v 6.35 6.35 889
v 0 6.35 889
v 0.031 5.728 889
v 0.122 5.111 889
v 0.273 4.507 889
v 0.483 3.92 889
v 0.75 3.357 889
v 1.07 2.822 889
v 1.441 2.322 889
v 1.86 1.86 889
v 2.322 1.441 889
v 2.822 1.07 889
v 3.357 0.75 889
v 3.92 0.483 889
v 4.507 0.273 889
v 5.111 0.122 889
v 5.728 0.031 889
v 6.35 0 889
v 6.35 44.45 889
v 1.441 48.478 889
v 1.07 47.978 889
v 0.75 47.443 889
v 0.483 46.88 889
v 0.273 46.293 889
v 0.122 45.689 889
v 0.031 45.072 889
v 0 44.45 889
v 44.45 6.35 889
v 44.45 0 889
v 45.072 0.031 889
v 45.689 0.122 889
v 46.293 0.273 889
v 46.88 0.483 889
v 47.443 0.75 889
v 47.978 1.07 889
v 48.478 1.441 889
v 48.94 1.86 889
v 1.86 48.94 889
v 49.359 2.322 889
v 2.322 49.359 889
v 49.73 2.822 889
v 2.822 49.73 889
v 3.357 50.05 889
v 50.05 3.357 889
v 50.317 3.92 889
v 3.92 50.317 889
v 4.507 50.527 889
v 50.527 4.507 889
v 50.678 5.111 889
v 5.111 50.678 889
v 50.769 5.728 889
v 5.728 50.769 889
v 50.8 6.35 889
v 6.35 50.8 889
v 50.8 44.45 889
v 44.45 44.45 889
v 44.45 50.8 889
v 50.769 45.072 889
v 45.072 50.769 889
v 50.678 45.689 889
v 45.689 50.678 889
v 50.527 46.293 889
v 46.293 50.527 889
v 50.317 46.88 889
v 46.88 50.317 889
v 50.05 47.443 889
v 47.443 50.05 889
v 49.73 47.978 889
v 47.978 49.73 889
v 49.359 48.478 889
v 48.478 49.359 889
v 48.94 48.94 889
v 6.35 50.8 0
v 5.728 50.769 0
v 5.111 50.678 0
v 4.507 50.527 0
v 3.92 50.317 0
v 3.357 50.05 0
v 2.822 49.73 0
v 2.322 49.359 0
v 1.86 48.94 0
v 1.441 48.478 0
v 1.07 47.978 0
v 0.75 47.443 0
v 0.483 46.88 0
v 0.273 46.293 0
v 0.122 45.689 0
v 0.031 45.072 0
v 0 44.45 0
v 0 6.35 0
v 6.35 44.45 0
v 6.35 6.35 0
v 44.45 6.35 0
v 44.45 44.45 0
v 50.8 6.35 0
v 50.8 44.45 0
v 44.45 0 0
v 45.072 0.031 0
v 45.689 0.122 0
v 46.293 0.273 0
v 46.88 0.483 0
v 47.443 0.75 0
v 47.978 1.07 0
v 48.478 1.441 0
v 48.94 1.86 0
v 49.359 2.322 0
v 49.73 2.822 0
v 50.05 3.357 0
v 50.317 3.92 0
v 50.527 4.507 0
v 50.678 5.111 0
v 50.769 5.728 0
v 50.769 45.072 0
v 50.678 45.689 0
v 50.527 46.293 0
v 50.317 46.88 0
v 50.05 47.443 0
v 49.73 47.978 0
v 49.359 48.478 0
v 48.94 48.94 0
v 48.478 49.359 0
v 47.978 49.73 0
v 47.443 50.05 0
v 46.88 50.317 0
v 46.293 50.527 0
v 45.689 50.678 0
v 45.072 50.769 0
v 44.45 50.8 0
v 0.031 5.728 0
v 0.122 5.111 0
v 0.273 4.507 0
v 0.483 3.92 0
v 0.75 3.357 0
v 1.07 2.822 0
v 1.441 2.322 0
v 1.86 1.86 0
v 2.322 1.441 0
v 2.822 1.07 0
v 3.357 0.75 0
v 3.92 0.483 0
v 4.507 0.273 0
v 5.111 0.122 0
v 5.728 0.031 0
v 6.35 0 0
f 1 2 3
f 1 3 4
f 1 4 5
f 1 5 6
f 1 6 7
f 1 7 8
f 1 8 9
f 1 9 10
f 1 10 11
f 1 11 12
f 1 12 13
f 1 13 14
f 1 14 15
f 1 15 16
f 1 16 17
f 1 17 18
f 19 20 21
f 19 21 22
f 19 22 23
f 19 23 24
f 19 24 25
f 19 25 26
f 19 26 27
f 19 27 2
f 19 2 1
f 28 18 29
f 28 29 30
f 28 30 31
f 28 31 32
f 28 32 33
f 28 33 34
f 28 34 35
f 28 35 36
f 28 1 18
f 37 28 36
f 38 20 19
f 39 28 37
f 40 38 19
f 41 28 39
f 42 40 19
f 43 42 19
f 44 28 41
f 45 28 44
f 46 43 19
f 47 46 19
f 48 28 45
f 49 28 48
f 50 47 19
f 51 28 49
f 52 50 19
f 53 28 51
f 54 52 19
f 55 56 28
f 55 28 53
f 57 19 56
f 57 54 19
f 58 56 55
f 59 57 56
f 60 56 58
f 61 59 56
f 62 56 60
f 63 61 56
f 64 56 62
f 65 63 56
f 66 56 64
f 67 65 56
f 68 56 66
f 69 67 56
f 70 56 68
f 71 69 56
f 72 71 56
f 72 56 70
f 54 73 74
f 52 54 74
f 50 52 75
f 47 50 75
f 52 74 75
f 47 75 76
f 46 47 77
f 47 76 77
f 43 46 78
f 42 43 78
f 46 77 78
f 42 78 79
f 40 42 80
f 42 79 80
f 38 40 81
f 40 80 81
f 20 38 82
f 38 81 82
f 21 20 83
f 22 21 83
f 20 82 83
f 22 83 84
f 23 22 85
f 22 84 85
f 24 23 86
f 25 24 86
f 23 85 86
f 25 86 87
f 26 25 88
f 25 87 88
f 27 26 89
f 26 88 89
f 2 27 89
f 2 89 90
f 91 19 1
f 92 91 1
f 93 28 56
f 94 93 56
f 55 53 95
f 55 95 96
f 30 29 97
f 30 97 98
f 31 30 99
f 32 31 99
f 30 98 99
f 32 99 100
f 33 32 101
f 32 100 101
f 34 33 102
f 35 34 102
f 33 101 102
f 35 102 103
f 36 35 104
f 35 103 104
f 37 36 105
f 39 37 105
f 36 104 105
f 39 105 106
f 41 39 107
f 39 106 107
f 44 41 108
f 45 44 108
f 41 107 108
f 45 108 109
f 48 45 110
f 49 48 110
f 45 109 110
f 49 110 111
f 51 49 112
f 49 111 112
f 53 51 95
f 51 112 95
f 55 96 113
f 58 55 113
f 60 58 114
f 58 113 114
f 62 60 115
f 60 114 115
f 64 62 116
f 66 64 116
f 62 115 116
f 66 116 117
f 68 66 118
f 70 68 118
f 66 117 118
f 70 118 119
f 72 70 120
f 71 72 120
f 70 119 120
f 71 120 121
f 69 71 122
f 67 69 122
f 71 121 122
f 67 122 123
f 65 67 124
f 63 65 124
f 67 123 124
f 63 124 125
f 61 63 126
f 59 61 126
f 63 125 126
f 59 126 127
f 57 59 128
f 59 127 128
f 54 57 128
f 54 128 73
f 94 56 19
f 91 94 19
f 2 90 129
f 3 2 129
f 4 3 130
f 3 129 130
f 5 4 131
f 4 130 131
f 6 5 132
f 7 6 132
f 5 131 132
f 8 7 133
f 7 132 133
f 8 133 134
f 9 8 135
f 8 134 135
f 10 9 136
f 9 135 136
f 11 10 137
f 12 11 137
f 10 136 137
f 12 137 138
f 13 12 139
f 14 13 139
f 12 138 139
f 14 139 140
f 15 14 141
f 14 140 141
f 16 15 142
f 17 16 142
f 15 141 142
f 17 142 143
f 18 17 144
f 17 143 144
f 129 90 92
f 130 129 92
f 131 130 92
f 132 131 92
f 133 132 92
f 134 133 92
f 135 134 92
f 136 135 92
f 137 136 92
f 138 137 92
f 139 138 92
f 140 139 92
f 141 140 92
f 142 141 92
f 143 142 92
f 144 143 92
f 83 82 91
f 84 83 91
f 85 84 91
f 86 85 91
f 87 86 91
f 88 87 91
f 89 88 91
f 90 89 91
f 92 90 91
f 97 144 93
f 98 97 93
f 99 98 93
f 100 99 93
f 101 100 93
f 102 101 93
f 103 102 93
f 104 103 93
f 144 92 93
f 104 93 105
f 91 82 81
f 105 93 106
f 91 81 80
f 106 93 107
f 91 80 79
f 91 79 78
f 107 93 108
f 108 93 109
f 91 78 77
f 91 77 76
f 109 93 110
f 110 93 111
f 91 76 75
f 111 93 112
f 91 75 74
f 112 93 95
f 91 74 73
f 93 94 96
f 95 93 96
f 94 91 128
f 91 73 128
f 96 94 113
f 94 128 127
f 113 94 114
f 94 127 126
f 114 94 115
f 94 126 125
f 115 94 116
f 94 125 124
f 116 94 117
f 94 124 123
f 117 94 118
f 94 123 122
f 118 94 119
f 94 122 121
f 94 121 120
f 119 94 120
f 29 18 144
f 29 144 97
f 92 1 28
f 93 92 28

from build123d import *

# Parameters (mm, degrees)
F1_DEPTH = 889
F2_T     = 6.35


# Not quite as in the source:
# - a shell that OpenCascade refuses in one call is made with other operations: the cavity is built on its own and cut out


with BuildPart() as f1:
    # F0 (on Top) → F1 (new body)
    with BuildSketch(Plane.XY):
        with BuildLine():
            ThreePointArc((0, 6.35), (1.8598719395, 1.8598719395), (6.35, 0))
            Line((6.35, 0), (44.45, 0))
            ThreePointArc((44.45, 0), (48.9401280605, 1.8598719395), (50.8, 6.35))
            Line((50.8, 6.35), (50.8, 44.45))
            ThreePointArc((50.8, 44.45), (48.9401280605, 48.9401280605), (44.45, 50.8))
            Line((44.45, 50.8), (6.35, 50.8))
            ThreePointArc((6.35, 50.8), (1.8598719395, 48.9401280605), (0, 44.45))
            Line((0, 44.45), (0, 6.35))
        make_face()
    extrude(amount=F1_DEPTH)

    # F2: shell of thickness 6.35, made by hand


with BuildPart() as f2_core1:
    # F2_t2: copy of F1
    add(f1.part)

    # the walls: a layer under each face that stays
    f2_faces = [f2_core1.faces().sort_by_distance(p)[0] for p in [
        (0, 25.4, 444.5),
        (25.4, 0, 444.5),
        (50.8, 25.4, 444.5),
        (25.4, 50.8, 444.5),
    ]]
    thicken(f2_faces, amount=-F2_T, mode=Mode.SUBTRACT)


with BuildPart() as f1_1:
    add(f1.part)

    # what is left inside the walls is the cavity
    f2_cavity = [f2_core1.part.solids().sort_by_distance(p)[0] for p in [
        (6.4135, 25.4, 592.666667),
    ]]
    add(f2_cavity, mode=Mode.SUBTRACT)


solid = f1_1.part
